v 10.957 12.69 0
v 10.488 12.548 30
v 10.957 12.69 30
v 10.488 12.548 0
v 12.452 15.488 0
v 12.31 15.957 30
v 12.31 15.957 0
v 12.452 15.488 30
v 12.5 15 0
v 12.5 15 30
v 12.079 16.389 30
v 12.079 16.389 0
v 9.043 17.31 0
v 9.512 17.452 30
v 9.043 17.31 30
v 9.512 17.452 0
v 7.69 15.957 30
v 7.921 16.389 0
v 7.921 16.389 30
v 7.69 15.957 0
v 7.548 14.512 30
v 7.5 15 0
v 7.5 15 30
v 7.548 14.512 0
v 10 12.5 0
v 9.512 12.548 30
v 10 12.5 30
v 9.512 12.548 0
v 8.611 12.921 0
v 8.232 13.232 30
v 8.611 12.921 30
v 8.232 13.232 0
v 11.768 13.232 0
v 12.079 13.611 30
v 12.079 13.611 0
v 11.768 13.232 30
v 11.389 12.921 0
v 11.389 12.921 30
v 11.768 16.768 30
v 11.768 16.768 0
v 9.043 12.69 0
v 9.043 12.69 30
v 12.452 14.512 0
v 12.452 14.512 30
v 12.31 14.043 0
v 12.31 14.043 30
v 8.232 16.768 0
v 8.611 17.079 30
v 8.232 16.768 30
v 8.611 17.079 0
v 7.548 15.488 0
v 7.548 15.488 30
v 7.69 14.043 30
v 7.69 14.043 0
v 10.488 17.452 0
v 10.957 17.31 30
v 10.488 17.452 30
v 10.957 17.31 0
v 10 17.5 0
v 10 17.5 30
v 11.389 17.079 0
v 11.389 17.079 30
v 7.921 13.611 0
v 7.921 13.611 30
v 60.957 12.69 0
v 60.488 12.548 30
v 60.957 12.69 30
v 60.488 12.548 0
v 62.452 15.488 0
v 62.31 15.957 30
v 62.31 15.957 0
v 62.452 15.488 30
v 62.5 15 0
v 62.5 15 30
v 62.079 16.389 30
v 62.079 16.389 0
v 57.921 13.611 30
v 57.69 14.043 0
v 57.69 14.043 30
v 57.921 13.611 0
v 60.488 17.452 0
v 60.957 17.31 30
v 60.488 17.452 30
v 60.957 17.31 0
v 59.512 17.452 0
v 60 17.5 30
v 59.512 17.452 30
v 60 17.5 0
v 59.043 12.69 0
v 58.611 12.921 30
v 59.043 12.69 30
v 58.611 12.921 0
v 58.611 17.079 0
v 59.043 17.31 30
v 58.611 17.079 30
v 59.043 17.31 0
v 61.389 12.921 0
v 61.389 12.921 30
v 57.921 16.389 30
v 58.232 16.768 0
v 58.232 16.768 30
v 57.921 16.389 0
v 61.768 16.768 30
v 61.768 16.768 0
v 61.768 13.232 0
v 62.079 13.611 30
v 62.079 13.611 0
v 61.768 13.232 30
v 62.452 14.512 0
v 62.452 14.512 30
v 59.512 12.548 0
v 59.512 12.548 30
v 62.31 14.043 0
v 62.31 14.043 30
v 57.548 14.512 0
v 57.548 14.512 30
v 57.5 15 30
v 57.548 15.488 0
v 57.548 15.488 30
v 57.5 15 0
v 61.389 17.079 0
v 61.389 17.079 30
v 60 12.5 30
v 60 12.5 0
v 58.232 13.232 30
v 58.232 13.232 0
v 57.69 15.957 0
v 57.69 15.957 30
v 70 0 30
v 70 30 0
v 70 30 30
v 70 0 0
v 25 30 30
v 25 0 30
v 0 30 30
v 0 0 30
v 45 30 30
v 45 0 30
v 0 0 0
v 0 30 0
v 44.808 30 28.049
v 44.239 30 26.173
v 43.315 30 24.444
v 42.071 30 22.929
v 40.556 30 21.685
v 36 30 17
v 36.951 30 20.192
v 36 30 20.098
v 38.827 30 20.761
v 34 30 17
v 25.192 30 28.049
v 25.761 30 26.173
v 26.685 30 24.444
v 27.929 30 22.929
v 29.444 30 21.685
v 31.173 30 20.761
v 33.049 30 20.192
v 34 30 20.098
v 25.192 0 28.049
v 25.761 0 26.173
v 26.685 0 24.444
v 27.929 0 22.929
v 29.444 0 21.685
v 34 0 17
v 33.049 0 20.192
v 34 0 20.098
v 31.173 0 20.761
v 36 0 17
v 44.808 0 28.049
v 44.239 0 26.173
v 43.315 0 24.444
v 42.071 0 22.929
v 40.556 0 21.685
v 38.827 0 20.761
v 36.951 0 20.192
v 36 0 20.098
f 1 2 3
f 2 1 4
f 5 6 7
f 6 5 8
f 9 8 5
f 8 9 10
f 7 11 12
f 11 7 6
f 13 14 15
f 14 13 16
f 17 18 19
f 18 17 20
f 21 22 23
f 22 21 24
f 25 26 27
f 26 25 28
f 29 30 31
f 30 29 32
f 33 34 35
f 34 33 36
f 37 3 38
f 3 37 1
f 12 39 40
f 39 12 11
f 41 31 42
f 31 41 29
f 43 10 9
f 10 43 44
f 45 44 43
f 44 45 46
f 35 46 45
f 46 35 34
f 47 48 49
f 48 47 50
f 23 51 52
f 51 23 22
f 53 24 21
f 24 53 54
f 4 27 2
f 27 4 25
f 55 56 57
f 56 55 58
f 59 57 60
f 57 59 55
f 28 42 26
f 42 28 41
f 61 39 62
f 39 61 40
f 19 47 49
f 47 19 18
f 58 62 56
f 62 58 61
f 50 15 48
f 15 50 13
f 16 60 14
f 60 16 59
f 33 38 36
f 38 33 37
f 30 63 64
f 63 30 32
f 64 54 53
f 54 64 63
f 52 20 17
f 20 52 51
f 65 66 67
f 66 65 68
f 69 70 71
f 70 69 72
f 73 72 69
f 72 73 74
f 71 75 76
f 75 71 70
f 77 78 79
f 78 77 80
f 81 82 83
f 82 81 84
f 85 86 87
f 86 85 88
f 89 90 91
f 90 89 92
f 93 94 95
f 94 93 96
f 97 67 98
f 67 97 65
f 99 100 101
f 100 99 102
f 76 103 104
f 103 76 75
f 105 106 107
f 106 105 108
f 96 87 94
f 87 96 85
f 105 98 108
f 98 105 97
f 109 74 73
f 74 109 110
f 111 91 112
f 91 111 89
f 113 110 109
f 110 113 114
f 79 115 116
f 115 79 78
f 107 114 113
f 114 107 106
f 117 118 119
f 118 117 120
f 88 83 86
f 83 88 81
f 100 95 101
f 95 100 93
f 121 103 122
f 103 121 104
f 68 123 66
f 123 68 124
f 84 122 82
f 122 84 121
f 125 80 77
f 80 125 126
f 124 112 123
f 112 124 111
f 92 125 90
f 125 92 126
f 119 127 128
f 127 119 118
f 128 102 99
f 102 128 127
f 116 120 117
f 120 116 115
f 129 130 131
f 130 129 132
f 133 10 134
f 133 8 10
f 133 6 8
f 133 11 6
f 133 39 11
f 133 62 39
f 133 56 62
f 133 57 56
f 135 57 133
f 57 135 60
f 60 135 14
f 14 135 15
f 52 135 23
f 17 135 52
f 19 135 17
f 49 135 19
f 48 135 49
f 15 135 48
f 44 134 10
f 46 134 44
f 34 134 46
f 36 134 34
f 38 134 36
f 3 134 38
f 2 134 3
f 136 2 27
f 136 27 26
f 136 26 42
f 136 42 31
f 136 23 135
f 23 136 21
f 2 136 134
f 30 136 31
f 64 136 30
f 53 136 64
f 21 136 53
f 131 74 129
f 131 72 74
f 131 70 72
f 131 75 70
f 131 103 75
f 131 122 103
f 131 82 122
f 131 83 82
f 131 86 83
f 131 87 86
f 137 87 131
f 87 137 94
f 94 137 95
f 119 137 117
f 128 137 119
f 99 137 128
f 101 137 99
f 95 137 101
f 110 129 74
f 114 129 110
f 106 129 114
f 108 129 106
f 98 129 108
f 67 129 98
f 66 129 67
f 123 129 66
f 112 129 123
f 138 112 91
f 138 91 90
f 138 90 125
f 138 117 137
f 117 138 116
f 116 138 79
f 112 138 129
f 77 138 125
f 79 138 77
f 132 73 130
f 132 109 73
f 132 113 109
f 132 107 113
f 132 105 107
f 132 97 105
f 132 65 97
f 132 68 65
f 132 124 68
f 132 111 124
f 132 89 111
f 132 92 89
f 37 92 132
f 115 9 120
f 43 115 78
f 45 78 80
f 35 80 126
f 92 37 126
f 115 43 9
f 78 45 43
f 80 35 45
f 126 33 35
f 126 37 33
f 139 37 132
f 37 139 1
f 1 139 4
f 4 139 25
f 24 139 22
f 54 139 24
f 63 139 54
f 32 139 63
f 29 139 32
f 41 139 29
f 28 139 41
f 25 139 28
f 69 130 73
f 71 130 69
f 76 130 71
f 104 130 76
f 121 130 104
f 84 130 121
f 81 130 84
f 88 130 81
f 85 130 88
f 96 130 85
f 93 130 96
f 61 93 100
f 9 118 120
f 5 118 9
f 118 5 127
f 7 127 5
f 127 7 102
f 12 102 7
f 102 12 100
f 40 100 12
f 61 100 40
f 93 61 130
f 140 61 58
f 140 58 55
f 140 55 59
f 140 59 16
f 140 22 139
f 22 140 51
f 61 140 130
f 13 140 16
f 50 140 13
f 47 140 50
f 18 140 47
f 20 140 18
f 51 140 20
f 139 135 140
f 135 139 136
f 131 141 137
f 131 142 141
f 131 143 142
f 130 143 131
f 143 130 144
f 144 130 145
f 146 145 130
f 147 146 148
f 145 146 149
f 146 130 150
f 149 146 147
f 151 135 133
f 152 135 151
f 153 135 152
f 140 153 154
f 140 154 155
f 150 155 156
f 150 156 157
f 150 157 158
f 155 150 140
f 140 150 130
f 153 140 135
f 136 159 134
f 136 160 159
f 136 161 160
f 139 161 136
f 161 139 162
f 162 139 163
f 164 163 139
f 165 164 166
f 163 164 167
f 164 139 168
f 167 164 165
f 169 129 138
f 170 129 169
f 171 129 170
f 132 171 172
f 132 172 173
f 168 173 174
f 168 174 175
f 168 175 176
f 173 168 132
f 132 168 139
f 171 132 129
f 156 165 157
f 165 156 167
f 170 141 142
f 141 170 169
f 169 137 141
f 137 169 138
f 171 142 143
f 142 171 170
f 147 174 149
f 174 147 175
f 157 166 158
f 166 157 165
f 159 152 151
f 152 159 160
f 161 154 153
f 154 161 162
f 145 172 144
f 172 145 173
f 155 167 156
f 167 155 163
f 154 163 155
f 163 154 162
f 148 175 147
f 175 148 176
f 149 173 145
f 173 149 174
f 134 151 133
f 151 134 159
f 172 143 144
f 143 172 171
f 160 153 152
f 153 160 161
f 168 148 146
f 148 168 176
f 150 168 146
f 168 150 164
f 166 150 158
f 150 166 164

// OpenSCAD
$fn = 32;

// ----------------------------------------------------------------------
// Saddle clamp: split shaft clamp
// ----------------------------------------------------------------------

// --- parameters (mm) ---
blk_l = 70;               // block length, X
blk_w = 30;               // block width, Y
blk_h = 30;               // block height
clamp_r = 10;             // shaft groove radius
hole_r = 2.5;             // bolt hole radius
hole_m = 10;              // bolt hole margin from the ends
saw_w = 2;                // saw kerf width
fit_tol = 0.1;            // tolerance for press fits, mm
free_tol = 0.3;           // tolerance for clearance fits, mm

saw_depth = clamp_r + 3;  // saw kerf depth

difference() {
  cube([blk_l, blk_w, blk_h]);
  translate([blk_l / 2, -1, blk_h])
    rotate([-90, 0, 0])
      cylinder(h = blk_w + 2, r = clamp_r);
  for (sx = [0, 1])
    translate([sx ? blk_l - hole_m : hole_m, blk_w / 2, -1])
      cylinder(r = hole_r, h = blk_h + 2);
  translate([blk_l / 2 - saw_w / 2, -1, blk_h - saw_depth])
    cube([saw_w, blk_w + 2, saw_depth + 1]);
}
